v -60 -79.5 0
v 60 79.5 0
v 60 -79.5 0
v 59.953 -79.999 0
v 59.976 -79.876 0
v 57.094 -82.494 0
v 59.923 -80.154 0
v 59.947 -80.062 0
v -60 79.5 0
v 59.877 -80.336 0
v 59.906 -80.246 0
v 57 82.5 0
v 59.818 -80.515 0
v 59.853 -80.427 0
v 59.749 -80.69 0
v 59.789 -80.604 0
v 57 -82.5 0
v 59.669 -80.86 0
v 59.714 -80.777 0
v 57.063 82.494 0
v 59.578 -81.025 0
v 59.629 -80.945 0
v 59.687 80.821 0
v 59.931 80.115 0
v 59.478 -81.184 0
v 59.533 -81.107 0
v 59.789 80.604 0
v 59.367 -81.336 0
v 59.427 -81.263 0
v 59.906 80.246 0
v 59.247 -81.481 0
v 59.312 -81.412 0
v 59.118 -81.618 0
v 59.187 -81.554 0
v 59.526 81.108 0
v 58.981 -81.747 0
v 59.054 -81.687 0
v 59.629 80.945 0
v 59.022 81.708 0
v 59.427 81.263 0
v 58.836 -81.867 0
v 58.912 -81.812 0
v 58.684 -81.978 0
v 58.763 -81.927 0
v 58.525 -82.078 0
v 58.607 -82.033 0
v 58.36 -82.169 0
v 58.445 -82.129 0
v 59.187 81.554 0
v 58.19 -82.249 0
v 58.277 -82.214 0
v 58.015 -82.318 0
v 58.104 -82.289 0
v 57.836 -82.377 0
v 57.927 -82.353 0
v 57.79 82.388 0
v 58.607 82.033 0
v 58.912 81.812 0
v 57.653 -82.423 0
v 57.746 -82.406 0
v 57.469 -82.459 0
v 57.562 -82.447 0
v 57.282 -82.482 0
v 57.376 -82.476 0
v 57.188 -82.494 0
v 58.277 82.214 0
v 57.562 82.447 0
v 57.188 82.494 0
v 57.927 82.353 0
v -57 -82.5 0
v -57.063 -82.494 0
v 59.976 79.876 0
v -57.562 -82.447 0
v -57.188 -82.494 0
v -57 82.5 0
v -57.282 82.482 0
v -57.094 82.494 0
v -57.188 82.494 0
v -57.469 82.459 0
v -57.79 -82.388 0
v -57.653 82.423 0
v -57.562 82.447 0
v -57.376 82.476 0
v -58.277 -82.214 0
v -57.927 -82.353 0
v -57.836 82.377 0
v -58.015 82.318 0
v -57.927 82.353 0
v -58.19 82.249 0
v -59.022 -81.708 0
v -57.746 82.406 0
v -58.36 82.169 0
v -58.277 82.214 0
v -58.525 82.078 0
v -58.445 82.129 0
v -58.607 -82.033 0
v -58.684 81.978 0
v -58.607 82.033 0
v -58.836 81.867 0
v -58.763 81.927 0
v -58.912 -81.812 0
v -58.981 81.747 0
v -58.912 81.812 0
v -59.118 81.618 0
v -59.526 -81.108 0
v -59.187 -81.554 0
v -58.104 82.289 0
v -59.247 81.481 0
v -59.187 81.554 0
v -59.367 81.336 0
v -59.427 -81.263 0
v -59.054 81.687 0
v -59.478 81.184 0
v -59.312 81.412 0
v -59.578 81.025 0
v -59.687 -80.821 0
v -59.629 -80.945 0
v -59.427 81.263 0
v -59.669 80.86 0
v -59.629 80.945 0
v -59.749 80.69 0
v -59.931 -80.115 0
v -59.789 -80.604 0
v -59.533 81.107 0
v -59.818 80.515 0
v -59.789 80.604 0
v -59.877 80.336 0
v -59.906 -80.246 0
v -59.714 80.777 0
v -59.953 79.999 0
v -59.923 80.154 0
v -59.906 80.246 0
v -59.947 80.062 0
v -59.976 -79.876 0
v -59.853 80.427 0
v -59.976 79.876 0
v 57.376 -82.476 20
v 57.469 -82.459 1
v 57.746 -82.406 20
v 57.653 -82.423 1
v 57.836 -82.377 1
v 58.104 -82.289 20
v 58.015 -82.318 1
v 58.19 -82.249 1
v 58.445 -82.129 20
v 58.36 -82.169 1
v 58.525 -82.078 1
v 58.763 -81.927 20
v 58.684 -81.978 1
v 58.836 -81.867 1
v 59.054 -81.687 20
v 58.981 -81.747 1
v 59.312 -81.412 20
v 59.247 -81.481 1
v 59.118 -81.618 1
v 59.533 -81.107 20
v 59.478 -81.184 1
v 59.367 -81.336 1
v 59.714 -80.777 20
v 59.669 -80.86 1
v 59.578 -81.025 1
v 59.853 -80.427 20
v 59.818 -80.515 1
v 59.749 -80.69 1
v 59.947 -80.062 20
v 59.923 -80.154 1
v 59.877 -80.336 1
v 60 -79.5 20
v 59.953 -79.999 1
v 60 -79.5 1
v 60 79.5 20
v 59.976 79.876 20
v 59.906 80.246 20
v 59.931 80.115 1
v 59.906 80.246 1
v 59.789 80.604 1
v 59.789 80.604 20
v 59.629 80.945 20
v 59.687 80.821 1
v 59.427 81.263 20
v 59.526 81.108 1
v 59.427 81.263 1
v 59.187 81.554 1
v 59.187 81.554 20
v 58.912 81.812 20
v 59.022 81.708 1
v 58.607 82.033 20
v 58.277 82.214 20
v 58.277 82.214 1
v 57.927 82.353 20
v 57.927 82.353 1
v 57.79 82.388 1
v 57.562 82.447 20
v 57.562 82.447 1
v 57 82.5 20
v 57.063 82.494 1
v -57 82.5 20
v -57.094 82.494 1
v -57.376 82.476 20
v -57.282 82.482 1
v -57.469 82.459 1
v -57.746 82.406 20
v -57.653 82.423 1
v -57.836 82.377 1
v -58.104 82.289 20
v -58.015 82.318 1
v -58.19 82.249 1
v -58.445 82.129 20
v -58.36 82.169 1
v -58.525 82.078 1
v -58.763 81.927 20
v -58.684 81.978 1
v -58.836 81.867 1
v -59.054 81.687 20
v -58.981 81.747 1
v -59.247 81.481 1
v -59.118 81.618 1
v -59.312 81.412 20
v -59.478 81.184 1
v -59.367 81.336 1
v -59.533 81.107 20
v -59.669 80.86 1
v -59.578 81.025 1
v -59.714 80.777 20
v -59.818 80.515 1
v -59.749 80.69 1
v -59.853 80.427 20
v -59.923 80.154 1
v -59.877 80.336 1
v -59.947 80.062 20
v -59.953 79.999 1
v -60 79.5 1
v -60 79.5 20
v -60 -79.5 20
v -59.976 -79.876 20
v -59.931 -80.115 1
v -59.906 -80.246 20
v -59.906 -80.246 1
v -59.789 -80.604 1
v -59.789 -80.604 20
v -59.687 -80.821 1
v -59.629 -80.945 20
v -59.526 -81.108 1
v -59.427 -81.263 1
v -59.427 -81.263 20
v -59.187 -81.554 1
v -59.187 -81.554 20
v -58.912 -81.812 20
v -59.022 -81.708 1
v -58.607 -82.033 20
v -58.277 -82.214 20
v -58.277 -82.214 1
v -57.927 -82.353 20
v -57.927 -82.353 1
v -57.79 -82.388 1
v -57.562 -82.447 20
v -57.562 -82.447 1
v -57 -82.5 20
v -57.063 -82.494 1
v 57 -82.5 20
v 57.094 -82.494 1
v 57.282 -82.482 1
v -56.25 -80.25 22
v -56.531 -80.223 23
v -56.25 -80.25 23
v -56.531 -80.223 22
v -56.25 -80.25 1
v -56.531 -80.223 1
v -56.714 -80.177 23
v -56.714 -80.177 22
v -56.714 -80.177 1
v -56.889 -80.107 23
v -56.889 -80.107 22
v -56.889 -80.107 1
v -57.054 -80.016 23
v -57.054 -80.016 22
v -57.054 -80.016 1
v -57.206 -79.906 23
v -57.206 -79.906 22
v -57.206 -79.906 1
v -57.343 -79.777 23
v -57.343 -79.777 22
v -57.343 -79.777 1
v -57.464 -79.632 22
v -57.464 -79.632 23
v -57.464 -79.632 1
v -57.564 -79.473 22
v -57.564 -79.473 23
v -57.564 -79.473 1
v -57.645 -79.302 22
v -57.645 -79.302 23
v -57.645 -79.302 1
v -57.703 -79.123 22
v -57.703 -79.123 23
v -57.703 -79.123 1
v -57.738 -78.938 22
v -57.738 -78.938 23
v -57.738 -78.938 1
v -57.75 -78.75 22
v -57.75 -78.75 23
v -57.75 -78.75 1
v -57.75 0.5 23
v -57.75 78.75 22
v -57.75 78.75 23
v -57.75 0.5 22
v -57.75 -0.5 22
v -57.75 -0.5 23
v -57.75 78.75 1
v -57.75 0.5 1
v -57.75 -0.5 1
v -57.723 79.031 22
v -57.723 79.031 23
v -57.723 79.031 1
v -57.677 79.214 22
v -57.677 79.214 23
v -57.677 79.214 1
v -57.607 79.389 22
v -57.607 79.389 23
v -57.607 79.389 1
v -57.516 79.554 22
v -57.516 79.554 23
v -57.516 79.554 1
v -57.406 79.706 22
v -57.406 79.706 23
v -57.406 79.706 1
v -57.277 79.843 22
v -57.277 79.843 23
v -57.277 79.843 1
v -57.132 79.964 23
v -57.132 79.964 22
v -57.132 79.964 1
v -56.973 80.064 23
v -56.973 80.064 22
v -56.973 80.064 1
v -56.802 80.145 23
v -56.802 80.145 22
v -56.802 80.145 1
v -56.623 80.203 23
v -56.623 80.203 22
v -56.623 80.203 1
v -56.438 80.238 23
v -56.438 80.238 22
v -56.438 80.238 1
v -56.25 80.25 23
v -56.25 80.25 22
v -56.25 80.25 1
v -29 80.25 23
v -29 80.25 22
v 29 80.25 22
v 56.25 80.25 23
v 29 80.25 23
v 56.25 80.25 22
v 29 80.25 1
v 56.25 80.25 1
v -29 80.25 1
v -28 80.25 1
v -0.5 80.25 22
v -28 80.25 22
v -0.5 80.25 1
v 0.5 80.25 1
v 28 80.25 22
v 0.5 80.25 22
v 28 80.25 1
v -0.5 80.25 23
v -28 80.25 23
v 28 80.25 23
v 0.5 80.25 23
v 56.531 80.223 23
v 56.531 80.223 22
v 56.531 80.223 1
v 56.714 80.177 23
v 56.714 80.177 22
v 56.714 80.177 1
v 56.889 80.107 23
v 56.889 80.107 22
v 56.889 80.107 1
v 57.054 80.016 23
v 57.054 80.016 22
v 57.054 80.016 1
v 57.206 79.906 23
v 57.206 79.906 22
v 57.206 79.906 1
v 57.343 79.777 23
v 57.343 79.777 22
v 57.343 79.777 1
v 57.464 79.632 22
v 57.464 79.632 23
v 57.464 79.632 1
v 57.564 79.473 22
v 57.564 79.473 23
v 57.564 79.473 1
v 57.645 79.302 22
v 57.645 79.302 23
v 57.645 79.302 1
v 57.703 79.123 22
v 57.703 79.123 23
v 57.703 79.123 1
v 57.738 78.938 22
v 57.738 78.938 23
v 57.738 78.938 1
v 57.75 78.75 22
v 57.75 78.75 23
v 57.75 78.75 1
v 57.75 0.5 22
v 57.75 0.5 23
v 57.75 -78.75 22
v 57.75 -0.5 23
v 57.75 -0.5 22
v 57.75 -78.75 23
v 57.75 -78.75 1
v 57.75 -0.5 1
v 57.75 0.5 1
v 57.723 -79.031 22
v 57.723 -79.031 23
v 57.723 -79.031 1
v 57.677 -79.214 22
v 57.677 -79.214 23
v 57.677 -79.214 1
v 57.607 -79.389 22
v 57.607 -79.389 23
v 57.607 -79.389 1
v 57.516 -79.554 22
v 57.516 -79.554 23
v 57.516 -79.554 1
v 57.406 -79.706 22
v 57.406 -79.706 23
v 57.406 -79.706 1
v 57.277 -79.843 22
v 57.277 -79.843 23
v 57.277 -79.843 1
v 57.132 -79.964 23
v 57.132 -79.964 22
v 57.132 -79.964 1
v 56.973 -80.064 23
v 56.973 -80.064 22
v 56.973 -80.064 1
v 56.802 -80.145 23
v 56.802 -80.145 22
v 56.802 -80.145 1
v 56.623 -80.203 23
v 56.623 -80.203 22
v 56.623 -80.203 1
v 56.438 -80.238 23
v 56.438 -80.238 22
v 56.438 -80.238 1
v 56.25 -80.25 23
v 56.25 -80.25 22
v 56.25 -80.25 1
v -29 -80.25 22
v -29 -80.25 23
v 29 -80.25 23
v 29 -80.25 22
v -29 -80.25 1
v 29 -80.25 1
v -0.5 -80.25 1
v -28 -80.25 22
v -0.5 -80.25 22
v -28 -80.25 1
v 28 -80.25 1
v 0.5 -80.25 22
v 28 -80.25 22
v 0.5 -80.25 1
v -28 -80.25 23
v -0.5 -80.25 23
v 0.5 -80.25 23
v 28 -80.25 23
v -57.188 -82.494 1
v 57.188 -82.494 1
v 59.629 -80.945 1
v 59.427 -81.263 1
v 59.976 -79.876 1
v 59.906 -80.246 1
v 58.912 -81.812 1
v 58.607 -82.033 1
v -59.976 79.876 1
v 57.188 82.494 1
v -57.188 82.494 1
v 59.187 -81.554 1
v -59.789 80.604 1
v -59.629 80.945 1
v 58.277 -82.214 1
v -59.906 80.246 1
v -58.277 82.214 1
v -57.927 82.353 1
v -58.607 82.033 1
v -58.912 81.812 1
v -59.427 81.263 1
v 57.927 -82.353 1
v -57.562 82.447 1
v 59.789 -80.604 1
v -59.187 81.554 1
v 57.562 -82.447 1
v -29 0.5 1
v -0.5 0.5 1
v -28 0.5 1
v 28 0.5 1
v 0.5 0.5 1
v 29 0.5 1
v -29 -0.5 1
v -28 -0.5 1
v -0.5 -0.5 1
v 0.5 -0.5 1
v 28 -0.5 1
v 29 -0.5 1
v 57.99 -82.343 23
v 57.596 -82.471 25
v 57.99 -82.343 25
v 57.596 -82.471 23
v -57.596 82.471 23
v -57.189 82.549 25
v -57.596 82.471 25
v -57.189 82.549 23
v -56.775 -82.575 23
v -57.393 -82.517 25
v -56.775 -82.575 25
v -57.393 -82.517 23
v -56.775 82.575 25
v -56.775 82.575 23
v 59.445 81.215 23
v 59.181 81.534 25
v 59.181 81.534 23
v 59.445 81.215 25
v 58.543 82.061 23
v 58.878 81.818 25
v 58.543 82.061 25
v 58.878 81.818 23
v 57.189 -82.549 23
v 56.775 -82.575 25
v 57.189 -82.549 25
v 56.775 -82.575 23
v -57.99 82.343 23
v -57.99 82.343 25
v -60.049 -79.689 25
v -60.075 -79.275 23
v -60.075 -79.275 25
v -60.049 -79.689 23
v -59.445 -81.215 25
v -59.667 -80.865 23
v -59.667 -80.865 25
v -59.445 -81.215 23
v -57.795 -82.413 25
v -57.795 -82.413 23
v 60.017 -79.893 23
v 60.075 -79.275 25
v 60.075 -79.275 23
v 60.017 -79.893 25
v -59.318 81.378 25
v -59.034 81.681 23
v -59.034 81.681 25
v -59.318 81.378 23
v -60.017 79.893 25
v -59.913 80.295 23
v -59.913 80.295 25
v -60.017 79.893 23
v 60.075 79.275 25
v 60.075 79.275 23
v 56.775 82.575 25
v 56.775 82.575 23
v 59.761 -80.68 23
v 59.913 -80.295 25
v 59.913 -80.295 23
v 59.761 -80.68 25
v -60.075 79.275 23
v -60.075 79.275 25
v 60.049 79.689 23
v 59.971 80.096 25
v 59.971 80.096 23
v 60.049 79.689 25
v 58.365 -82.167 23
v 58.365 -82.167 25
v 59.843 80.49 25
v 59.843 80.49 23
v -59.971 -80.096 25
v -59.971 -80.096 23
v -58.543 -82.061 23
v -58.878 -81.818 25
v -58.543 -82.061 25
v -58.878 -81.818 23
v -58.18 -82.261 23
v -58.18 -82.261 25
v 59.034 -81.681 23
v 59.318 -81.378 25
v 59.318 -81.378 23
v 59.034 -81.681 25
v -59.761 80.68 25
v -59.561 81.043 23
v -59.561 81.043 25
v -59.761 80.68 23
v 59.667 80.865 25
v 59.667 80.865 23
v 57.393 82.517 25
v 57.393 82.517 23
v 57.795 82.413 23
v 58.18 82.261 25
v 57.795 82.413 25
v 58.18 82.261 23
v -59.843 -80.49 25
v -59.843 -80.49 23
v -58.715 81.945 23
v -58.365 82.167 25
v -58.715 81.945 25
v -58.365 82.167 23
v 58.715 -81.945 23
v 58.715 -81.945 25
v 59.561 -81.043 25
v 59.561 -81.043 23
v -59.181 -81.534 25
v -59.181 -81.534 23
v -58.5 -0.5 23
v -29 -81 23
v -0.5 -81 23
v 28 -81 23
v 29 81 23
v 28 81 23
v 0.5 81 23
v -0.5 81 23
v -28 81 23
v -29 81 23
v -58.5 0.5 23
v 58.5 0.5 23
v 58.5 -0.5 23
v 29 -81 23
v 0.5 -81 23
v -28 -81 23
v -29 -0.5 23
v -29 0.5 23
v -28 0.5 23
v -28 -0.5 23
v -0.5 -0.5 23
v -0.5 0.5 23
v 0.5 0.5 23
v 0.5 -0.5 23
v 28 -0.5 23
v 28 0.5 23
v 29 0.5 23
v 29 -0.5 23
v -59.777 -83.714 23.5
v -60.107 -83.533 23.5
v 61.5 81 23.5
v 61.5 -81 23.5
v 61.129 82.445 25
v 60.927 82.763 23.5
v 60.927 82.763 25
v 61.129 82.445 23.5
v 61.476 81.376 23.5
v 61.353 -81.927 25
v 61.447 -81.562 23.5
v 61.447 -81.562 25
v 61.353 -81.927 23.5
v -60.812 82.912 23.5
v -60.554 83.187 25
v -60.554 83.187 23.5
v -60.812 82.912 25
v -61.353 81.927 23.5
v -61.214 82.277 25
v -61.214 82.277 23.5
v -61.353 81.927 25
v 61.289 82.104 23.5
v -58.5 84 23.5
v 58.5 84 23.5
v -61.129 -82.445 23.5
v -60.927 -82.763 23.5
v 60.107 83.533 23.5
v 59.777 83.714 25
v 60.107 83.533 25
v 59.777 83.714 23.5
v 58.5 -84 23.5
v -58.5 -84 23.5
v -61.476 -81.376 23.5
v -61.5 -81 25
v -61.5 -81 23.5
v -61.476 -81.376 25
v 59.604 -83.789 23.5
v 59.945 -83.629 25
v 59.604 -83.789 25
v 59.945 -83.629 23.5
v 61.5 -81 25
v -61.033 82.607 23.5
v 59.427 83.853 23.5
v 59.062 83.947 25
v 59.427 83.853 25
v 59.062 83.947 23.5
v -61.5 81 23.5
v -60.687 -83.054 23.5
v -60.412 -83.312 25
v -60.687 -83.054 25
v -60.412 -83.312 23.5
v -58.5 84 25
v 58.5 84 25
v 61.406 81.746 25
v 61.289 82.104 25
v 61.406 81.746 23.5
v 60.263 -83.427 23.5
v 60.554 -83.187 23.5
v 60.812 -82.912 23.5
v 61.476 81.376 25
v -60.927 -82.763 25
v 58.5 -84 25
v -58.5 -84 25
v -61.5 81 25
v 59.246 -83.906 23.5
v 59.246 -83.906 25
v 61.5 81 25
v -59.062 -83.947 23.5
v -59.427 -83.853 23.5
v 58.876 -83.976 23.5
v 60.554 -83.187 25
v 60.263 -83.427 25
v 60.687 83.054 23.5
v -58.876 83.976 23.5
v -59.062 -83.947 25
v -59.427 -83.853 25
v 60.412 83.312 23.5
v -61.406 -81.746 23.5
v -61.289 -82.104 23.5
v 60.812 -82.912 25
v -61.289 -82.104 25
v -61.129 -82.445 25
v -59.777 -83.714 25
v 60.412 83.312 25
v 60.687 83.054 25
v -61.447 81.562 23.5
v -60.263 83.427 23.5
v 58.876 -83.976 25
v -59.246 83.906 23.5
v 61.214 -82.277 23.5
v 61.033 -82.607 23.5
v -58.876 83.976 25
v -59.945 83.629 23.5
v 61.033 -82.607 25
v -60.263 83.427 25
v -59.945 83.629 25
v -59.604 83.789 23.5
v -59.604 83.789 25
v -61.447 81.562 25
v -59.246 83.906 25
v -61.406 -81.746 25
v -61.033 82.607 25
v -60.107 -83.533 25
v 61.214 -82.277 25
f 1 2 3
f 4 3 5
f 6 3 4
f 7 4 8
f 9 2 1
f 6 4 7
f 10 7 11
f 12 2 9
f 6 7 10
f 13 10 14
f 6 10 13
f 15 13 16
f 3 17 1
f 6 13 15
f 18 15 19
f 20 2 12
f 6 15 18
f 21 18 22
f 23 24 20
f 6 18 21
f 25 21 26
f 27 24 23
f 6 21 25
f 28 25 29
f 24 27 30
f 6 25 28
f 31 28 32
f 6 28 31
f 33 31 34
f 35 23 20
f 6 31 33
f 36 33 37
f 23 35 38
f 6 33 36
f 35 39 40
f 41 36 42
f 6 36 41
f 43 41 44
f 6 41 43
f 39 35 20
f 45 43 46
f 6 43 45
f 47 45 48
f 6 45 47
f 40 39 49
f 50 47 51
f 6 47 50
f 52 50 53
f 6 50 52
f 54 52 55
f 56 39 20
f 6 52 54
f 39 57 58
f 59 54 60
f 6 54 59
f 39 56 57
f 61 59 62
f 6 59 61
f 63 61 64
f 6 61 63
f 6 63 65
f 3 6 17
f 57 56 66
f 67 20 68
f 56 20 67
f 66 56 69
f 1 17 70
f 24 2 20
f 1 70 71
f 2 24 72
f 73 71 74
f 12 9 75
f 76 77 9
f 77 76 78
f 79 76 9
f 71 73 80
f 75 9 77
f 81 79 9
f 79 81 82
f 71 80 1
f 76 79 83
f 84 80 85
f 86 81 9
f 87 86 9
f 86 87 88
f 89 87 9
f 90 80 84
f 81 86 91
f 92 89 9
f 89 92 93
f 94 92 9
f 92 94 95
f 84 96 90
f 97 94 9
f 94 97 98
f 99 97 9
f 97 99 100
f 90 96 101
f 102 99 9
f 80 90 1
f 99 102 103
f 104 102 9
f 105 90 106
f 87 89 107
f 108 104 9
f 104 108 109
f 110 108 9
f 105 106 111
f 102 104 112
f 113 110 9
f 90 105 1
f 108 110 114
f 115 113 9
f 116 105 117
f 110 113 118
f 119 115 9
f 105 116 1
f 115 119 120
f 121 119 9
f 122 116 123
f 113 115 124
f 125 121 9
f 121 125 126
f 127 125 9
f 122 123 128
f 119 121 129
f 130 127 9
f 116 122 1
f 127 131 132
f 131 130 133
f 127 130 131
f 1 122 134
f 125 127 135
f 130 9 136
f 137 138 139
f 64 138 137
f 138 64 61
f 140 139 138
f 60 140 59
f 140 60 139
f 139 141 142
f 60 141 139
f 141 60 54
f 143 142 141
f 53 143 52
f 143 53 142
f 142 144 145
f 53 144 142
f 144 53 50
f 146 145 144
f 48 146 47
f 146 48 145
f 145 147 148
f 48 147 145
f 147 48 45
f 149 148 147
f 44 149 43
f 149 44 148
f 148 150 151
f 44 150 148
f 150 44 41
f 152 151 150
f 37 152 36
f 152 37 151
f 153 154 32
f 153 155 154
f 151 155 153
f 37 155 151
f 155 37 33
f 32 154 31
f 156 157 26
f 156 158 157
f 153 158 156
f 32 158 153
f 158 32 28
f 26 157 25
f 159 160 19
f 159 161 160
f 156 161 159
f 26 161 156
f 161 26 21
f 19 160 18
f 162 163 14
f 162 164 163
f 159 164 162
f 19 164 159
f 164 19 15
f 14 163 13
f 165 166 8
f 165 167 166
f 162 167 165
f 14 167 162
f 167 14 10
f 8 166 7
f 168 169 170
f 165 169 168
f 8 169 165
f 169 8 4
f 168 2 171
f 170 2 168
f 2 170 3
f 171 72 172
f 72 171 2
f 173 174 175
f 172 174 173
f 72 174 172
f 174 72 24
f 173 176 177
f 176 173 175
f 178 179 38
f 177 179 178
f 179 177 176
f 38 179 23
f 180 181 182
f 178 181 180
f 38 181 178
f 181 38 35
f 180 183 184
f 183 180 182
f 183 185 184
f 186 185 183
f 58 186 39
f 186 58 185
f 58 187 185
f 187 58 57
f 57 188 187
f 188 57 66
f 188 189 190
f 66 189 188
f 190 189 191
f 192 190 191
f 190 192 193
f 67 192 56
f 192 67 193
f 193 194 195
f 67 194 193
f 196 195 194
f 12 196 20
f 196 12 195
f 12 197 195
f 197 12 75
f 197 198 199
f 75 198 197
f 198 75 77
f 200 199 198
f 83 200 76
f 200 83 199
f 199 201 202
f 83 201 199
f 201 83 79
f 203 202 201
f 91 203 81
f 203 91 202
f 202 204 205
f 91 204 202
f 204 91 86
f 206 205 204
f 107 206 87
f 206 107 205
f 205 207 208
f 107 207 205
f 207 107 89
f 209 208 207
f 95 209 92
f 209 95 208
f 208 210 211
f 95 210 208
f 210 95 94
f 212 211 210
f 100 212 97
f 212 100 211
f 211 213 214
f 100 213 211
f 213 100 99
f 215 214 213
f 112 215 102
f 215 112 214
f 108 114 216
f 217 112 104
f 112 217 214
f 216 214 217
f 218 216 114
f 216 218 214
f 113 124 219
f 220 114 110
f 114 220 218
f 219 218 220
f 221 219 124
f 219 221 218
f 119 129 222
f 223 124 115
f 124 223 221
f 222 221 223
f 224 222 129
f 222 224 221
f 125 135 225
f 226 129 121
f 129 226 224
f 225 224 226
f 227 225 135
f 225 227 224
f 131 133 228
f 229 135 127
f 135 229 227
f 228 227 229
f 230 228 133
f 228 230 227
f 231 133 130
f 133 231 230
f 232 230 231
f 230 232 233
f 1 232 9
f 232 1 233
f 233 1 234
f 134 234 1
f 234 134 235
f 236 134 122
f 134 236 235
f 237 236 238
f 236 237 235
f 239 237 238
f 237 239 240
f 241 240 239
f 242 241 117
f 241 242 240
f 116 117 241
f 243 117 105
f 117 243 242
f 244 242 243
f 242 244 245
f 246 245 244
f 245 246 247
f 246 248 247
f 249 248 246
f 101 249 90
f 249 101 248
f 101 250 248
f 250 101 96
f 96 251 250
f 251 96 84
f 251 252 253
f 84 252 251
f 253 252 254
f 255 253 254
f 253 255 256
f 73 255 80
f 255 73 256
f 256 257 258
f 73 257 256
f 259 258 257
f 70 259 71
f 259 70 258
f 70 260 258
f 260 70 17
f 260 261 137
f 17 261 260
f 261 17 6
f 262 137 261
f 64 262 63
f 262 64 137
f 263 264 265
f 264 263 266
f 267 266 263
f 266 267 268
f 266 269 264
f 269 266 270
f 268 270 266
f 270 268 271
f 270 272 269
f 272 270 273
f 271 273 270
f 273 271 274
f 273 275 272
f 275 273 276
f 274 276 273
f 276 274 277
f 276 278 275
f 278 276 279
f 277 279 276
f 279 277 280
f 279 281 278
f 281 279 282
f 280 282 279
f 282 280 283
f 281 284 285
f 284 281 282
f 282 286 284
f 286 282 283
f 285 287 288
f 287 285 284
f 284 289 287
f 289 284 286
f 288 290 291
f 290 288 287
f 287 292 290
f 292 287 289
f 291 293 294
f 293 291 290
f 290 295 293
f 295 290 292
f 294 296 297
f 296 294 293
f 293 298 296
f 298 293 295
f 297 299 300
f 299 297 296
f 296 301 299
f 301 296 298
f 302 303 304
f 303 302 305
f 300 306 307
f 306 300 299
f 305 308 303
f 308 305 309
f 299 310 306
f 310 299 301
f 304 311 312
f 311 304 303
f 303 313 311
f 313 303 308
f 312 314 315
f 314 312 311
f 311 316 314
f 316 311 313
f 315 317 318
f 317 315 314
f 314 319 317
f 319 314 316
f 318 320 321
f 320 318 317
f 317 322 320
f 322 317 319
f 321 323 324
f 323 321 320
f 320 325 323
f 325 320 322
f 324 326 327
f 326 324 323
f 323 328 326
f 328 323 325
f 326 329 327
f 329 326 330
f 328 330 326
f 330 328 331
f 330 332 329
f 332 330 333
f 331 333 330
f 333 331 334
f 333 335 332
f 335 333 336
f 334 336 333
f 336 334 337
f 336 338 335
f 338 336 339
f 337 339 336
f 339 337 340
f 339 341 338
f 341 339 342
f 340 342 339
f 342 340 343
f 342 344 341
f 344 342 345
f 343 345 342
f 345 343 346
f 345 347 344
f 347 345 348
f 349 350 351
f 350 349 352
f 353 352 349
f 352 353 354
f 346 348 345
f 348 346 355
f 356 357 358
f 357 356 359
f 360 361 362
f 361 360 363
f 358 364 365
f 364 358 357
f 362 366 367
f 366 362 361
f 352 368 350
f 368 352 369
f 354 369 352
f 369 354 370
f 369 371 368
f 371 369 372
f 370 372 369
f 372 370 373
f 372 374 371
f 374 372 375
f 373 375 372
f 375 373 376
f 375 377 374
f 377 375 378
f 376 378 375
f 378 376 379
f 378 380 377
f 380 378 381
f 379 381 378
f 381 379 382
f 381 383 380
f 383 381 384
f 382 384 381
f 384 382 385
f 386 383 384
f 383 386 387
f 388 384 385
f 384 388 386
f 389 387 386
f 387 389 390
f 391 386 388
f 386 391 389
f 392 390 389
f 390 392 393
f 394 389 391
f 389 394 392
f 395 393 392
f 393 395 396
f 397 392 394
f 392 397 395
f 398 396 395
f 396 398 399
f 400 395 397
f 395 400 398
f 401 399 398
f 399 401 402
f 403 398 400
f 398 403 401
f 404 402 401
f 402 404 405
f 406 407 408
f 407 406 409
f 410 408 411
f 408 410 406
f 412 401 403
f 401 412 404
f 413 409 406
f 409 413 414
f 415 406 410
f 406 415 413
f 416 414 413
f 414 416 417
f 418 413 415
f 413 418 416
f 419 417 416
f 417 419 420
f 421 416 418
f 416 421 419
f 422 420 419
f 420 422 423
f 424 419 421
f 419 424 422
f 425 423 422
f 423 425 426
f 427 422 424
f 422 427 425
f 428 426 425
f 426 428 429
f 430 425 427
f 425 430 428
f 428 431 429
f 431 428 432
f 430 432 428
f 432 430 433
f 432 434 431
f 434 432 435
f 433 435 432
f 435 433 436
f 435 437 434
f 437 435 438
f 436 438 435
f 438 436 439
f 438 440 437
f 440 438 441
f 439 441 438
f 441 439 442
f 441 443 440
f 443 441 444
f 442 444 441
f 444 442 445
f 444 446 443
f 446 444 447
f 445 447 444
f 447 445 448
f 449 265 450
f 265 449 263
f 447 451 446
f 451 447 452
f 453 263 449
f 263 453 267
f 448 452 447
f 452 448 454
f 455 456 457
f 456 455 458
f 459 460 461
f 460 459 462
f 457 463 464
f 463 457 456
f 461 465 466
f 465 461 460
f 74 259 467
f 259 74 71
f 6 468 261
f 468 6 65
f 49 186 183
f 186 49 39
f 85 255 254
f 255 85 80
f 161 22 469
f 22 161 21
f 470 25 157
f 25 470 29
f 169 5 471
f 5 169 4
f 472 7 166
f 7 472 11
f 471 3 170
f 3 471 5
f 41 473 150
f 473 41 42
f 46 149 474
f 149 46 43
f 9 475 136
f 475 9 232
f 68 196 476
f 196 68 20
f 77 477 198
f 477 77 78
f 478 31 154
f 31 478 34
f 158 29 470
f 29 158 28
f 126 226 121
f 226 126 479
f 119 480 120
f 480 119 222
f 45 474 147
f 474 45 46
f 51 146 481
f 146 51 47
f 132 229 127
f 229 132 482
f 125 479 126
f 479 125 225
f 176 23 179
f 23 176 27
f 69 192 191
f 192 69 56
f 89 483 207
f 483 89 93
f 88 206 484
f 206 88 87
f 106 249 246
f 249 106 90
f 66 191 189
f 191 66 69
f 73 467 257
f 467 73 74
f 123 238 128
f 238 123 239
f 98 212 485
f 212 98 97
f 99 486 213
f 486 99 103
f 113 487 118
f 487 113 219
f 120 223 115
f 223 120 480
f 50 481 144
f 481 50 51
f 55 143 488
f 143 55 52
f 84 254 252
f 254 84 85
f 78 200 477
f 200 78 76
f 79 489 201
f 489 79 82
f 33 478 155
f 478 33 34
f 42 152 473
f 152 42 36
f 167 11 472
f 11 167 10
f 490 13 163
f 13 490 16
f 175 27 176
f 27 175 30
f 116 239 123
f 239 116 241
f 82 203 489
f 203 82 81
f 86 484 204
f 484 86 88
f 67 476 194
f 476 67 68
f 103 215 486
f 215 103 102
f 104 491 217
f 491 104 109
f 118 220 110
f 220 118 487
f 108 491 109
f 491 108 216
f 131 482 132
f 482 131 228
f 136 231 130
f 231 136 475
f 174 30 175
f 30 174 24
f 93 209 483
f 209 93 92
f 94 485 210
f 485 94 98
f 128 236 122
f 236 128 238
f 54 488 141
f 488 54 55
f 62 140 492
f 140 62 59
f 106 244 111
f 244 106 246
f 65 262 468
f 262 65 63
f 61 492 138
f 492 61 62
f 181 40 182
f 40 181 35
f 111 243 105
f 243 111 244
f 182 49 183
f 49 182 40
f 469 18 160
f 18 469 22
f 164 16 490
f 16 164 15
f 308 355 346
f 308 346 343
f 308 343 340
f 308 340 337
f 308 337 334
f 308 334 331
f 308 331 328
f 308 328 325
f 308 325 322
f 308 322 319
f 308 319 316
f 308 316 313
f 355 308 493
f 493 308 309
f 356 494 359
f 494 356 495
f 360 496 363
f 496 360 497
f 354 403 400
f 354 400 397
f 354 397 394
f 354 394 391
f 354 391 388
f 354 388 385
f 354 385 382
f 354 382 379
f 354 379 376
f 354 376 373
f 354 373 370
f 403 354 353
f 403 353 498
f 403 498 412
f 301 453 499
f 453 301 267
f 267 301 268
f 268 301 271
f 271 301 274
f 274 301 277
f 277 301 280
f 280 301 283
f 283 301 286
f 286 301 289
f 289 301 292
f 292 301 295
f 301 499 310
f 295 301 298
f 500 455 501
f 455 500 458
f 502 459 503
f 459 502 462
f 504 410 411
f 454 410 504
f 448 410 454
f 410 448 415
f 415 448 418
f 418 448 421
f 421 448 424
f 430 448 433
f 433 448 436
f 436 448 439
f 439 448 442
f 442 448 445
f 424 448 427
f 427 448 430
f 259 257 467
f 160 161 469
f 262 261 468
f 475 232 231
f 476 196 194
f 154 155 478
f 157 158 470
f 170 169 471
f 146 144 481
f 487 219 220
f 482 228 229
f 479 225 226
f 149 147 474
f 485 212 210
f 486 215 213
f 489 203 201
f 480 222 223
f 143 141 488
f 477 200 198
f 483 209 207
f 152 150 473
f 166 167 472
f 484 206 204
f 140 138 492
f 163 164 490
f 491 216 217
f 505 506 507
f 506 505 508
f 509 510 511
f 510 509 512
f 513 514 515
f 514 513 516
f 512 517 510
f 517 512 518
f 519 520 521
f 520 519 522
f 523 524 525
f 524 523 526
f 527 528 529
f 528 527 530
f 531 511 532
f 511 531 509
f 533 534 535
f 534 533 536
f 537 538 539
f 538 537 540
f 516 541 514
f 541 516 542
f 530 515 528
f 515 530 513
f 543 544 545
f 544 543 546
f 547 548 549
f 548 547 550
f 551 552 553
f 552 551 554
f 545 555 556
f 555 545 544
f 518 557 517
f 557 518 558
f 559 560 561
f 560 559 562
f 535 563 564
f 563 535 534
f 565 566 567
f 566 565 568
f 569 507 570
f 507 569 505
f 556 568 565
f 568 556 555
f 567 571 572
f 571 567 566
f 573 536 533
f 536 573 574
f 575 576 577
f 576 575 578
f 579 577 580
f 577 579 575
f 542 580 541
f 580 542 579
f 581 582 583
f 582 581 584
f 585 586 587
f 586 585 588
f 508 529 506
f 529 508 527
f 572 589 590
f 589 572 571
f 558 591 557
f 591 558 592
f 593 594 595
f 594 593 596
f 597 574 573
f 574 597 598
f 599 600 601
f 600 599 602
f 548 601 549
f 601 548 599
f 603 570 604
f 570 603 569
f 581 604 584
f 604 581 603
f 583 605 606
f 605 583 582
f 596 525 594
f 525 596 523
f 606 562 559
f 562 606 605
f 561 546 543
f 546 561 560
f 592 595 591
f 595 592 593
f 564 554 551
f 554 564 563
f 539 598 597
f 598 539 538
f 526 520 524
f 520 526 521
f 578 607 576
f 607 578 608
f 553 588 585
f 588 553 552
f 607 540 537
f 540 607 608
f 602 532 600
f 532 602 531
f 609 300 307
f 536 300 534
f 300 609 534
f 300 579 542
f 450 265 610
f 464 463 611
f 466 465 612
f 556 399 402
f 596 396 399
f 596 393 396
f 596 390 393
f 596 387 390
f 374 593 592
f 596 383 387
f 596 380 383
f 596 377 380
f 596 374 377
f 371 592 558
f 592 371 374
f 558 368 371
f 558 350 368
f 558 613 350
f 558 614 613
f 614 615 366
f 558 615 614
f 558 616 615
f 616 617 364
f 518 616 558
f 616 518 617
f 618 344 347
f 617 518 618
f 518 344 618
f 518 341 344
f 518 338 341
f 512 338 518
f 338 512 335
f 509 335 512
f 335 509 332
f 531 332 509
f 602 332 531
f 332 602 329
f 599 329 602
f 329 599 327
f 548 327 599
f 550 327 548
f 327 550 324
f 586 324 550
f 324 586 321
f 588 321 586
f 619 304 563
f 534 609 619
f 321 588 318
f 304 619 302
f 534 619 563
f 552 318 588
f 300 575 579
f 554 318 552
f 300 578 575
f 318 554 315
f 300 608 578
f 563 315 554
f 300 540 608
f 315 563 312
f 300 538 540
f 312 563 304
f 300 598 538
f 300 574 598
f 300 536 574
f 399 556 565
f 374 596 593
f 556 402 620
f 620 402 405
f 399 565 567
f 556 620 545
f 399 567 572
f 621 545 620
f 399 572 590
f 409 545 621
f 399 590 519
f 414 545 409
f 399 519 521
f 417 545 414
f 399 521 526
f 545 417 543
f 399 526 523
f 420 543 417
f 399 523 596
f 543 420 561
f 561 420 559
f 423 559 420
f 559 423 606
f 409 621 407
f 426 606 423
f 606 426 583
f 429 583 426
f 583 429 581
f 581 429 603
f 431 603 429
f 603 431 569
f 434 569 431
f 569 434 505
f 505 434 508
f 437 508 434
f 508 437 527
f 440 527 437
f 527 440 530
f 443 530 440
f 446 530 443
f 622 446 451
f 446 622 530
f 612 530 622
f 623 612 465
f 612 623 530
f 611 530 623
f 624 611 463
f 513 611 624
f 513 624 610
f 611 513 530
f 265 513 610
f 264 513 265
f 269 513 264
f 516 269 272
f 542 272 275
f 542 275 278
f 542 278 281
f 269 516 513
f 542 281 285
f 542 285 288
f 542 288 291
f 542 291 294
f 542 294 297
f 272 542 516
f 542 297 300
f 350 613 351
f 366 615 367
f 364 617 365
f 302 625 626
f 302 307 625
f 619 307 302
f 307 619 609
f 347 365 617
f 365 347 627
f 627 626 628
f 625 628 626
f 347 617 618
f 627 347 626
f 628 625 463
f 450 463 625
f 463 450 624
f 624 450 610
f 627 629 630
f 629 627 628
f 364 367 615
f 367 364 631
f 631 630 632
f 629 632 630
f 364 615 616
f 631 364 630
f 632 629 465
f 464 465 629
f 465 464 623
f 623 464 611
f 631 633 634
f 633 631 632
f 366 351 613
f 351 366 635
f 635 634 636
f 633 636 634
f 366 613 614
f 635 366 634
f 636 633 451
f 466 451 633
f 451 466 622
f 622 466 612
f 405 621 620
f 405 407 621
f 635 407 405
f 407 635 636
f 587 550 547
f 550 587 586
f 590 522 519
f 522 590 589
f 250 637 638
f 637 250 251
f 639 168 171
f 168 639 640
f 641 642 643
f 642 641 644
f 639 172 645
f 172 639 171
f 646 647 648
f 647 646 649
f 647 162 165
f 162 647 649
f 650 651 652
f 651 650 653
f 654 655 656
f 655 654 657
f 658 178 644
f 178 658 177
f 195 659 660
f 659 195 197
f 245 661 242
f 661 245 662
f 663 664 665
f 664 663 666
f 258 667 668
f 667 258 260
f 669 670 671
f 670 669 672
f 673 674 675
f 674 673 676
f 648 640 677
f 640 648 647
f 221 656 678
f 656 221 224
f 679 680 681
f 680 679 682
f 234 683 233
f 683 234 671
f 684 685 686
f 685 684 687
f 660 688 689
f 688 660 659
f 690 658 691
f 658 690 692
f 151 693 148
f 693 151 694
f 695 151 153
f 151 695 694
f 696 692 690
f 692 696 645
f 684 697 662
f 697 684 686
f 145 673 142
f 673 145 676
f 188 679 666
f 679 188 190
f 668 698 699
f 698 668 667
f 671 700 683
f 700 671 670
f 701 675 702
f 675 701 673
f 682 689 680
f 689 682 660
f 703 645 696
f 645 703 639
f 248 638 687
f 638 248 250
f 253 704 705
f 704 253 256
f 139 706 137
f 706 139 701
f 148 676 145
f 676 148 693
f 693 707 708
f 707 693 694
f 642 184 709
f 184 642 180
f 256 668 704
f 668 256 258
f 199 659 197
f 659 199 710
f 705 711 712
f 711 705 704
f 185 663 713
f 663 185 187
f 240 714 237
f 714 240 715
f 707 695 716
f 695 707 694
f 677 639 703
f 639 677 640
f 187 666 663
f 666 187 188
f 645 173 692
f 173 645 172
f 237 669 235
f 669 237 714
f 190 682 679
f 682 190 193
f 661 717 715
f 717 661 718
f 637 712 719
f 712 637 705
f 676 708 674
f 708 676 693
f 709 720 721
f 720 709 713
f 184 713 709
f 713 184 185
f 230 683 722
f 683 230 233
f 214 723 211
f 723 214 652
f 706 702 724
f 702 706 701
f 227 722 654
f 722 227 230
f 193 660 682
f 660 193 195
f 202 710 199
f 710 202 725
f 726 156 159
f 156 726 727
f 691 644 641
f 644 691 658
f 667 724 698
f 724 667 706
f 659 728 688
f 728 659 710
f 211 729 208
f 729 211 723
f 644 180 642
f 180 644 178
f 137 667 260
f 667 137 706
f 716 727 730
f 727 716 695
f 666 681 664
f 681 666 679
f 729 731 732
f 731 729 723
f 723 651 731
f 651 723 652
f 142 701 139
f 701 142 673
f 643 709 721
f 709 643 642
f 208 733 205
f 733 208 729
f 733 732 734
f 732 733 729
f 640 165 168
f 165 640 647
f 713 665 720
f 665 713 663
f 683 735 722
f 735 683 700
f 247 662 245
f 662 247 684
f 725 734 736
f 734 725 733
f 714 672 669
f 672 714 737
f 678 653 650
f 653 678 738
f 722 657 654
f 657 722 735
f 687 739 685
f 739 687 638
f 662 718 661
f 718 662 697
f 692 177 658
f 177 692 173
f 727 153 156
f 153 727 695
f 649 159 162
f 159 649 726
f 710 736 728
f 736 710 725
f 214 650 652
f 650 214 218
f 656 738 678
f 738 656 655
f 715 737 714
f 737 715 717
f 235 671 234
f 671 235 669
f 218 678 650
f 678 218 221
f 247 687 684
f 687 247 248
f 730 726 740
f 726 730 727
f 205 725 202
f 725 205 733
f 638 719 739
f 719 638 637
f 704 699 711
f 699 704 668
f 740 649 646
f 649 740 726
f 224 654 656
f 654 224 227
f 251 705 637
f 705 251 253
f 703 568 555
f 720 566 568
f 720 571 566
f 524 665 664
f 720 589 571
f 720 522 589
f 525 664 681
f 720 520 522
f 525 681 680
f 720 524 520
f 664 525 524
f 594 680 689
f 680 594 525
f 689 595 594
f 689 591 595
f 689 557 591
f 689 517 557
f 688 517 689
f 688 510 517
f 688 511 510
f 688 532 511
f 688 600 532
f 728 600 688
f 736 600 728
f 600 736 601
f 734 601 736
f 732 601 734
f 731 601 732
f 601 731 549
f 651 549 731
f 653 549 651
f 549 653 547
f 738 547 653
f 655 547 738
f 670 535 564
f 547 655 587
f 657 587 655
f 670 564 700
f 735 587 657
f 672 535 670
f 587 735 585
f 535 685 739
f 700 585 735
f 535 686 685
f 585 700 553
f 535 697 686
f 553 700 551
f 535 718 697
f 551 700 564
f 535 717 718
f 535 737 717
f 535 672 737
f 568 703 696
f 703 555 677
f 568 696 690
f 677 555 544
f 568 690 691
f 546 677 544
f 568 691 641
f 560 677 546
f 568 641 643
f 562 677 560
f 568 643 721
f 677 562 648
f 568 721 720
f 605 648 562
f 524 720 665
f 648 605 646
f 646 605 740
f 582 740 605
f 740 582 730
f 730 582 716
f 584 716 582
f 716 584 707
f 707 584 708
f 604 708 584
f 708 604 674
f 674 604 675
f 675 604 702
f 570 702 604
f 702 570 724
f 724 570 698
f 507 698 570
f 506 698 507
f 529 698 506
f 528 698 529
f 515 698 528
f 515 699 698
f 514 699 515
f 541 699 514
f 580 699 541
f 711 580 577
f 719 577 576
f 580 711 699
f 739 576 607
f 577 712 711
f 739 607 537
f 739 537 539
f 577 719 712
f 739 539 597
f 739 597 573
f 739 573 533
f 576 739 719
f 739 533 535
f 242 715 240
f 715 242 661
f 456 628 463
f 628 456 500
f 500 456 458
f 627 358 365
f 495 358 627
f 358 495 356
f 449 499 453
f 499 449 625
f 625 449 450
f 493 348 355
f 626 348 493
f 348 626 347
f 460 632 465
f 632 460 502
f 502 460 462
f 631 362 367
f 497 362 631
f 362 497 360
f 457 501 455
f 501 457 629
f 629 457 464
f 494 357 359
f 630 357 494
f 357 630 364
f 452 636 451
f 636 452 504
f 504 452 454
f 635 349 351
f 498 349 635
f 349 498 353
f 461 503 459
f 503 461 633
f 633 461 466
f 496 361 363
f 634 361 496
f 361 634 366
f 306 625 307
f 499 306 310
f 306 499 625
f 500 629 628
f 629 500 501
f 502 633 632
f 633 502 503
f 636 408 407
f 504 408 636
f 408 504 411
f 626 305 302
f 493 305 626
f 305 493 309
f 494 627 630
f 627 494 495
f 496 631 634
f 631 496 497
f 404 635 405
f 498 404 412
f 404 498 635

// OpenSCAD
$fn = $preview ? 50 : 50;

/*[Part]*/
// Select part to render
PART = "container"; //[container, lid, modules]

// Select module to render. Only applies if model is selected above
MODULE = "module_snap"; //[module_snap, module_hinge_knuckle, module_hinge_leaf]

// Generate Snap module for lid. If false snap module will interconnect boxes
SNAP_MODULE_LID = true;

/*[Dimensions]*/
// Add a top rim
RIM = true;

// Add Module Bay
MODULE_BAY = false;

// Number of MODBAY Screws
MOD_SCREWS = "4"; //[2vertical, 2horizontal, 4]

// Container Length in mm
BOX_L_OUTER = 165; //[50:5:300]

// Container Width in mm
BOX_W_OUTER = 120; //[50:5:300]

// Container Height in mm
BOX_H_OUTER = 25; //[25:5:300]

// Lid Thickness in mm
LID_H = 3; //[3:1:10]

// Corner Radius in mm
CORNER_RADIUS = 3; //[1:1:10]

// Top Rim in mm. Rim height is derived from this. This might interfere with module bay on low height containers
RIM_W = 3; //[3:1:10]

// Outer Wall Thickness
WALL_THICKNESS = 1.5; //[1:0.5:10]

// Inner Wall Thickness
DIVIDER_THICKNESS = 1; //[1:1:10]

// Floor Thickness
FLOOR_THICKNESS = 1; //[1:1:10]

// Number of Divisions on the Long Edge
DIVISIONS_L = 1; //[0:1:20]

// Number of Divisions on the Short Edge
DIVISIONS_W = 3; //[0:1:20]

// Width of Lock Fixtures
FIXTURE_W = 5; //[3:1:10]

// Thickness of Lock Fixtures
FIXTURE_THICKNESS = 4; //[3:1:10]

// Diamenter of Lock Bolts
HINGE_BOLT_D = 1.1; //[1:0.1:4]

// Screw insert Diameter
INSERT_D = 4; //[3:0.5:8]

// Add Module bottom snap socket
SNAP_SOCKET = true;

/*[Hidden]*/
module __customizer_limit__() {};
// above 2 lines make sure customizer does not show parameters below

// Width of Interlocking Mechanism
MODBAY_W = 30; //[20:2.5:50]

// Depth of Modbay
MODBAY_DEPTH = 12; //[10:1:20]

// Modbay Screw Coordinates
MBCs = [
    [ [ 0, 3, 5 ], [ 0, 3, 15 ] ],                             // 2vertical
    [ [ 9, 3, 13 ], [ -9, 3, 13 ] ],                           // 2horzontal
    [ [ 0, 3, 5 ], [ 0, 3, 15 ], [ 9, 3, 13 ], [ -9, 3, 13 ] ] // 4
];

MODBAY_SCREW_COORDINATES = MOD_SCREWS == "2vertical" ? MBCs[0] : MOD_SCREWS == "2horizontal" ? MBCs[1] : MBCs[2];

BOX_L = BOX_L_OUTER - 2 * CORNER_RADIUS; // Box Width
BOX_W = BOX_W_OUTER - 2 * CORNER_RADIUS; // Box Length
BOX_H = BOX_H_OUTER;                     // Box Height

// width module center
MOD_W = 15;

// module bay gap
MODBAY_GAP = 0.1;

POST_OFFSET = 10;

// Offset between snapping parts
PART_OFFSET = 0.3;

///////////////////////////////////////////////////////////////////////////////
// Derived Variables
///////////////////////////////////////////////////////////////////////////////

module_bay_offset = BOX_L / 2 + CORNER_RADIUS;

hinge_offset = BOX_L / 2 + CORNER_RADIUS;
hinge_coordinates = [[MODBAY_W / 2 - FIXTURE_W, hinge_offset, 0], [-MODBAY_W / 2, hinge_offset, 0]];

mod_template_height = BOX_H - RIM_W;

///////////////////////////////////////////////////////////////////////////////
// Modules
///////////////////////////////////////////////////////////////////////////////

// Container modules
////////////////////

module base_plate(length, width, thickness)
{
    corner_coordinates = [ [ 0, 0 ], [ 0, length ], [ width, length ], [ width, 0 ] ];

    translate([ -width / 2, -length / 2 ])
    {
        hull()
        {
            for (i = corner_coordinates)
            {
                translate(i) cylinder(r = CORNER_RADIUS, h = thickness);
            };
        };
    };
};

module container_hull()
{
    ext_h = RIM ? BOX_H - RIM_W : BOX_H;
    linear_extrude(ext_h) difference()
    {
        offset(r = CORNER_RADIUS) square([ BOX_W, BOX_L ], center = true);

        offset(r = CORNER_RADIUS - WALL_THICKNESS)
            square([ BOX_W - WALL_THICKNESS, BOX_L - WALL_THICKNESS ], center = true);
    }
    base_plate(BOX_L, BOX_W, FLOOR_THICKNESS);
};

module box_rim()
{
    difference()
    {
        hull()
        {
            // upper face
            translate([ 0, 0, -RIM_W / 2 ])
            {
                linear_extrude(RIM_W / 2)
                {
                    offset(r = CORNER_RADIUS) square([ BOX_W + RIM_W, BOX_L + RIM_W ], center = true);
                };
            };
            // lower face
            translate([ 0, 0, -2 * RIM_W + 1 ])
            {
                linear_extrude(RIM_W / 2)
                {
                    offset(r = CORNER_RADIUS) square([ BOX_W, BOX_L ], center = true);
                };
            };
        };
        // cutout
        union()
        {
            // upper
            translate([ 0, 0, -2 ])
            {
                linear_extrude(5)
                {
                    offset(r = CORNER_RADIUS + .3)
                        square([ BOX_W - RIM_W / 4 + PART_OFFSET, BOX_L - RIM_W / 4 + PART_OFFSET ], center = true);
                };
            };
            // lower
            translate([ 0, 0, -BOX_H / 2 ]) linear_extrude(BOX_H)
            {
                offset(r = CORNER_RADIUS - WALL_THICKNESS)
                    square([ BOX_W - WALL_THICKNESS, BOX_L - WALL_THICKNESS ], center = true);
            };
        };
    };
};

module module_bay_cutout(offset)
{
    cut_depth = MODBAY_DEPTH;
    cut_position_y = offset - cut_depth / 2;
    width = MOD_W + MODBAY_GAP;

    translate([ -width / 2, cut_position_y, 0 ])
    {
        cube([ width, cut_depth, BOX_H * 2 ]);
    };

    translate([ 0, module_bay_offset - 4, 0 ]) minkowski()
    {
        mod_template();
        translate([ 0, 0, 0 ]) cube([ MODBAY_GAP, 4, 2 ], center = true);
    };
};

module add_corner_concave(radius, thickness)
{
    rotate(90, [ 0, 1, 0 ]) difference()
    {
        cube([ radius, radius, thickness ]);
        cylinder(r = radius, h = thickness);
    };
};

module cut_corner_convex(radius, rotation, position, thickness)
{
    translate(position)
    {
        rotate(rotation, [ 1, 0, 0 ])
        {
            add_corner_concave(radius, thickness);
        };
    };
};

module module_bay()
{
    module insert_hole(coordinate)
    {
        // cut hole for screw insert
        y = coordinate[0];
        x = coordinate[1];
        z = coordinate[2];
        translate([ 4.5, y, z ])
        {
            rotate(90, [ 0, 1, 0 ])
            {
                cylinder(d = INSERT_D, h = 3, center = true);
            };
        };
    };

    translate([ 0, BOX_L_OUTER / 2, 0 ]) rotate(-90, [ 0, 0, 1 ]) render()
    {
        union()
        {
            difference()
            {
                // shell
                translate([ 1, 0, 0 ]) rotate(-90, [ 0, 0, 1 ]) difference()
                {
                    minkowski()
                    {
                        mod_template();
                        translate([ 0, 1, -1 ]) cube([ 3, 4, 4 ], center = true);
                    };
                    translate([ -25, -1, BOX_H - 2 ]) cube(50);
                    translate([ -25, -1, -50 ]) cube(50);
                };
                //  cutout
                rotate(-90, [ 0, 0, 1 ]) minkowski()
                {
                    mod_template();
                    translate([ 0, -1.5, 0 ]) cube([ 0.1, 3, 0.2 ], center = true);
                };
                for (i = MODBAY_SCREW_COORDINATES)
                {
                    insert_hole(i);
                };
            };
            translate([ 1.5, 0, 1.5 ]) cube([ 3, 7.5, 3 ], center = true);
        };
    };
};

module division(count, length, width)
{
    step_x = width / (count + 1);
    for (i = [1:count])
    {
        translate([ -width / 2 + i * step_x, 0, BOX_H / 2 - 0.5 ])
        {
            cube([ DIVIDER_THICKNESS, length + RIM_W, BOX_H - RIM_W ], center = true);
        };
    };
};

// Lid modules
//////////////

module hinge_knuckle()
{
    rotate(90, [ 0, 1, 0 ]) difference()
    {
        union()
        {
            cylinder(h = MOD_W, d = 3.5, center = true);
            hull()
            {
                translate([ 1.0, 0, 0 ]) cube(size = [ 3, 3, MOD_W ], center = true);
                translate([ 3.5, 3, 0 ]) cube(size = [ 1, 3, MOD_W ], center = true);
            };
        };
        cylinder(h = MOD_W, d = HINGE_BOLT_D, center = true);
        translate([ -2.25, 0, 0 ]) cube(MOD_W / 2, center = true);
    };
};

module lid_phase()
{
    translate([ BOX_L / 2 - FIXTURE_W, BOX_W / 2 + 0.5, LID_H - 2 ])
    {
        rotate(45, [ 1, 0, 0 ])
        {
            cube([ BOX_L, LID_H, LID_H ]);
        };
    };
};

module lid_snap_lock()
{
    union()
    {
        translate([ 0, 5.5, 0 ]) cube([ 15 + 2 * MODBAY_GAP, 5, 2.1 ], center = true);
        translate([ 7.5 + MODBAY_GAP, 0, 3 ]) rotate(180, [ 0, 1, 0 ]) cube([ 4 + 2 * MODBAY_GAP, 5, LID_H ]);
        translate([ -3.5 + MODBAY_GAP, 0, 3 ]) rotate(180, [ 0, 1, 0 ]) cube([ 4 + 2 * MODBAY_GAP, 5, LID_H ]);
    };
};

//  Module bay modules
//////////////////////

module mod_clip_tip_half(positive = true)
{
    // dimensions
    lock_w = 15;
    corner_r = 3;
    thickness = 3;
    lock_offset = 0.2;
    lock_height = 10;

    module shape()
    {
        hull()
        {
            cube([ MOD_W / 2, thickness, 1 ]);

            translate([ 0, 0, lock_height ]) cube([ 1, thickness, 1 ]);
            translate([ lock_w / 2 - corner_r, corner_r, 8 ]) rotate(90, [ 1, 0, 0 ])
                cylinder(r = corner_r, h = thickness);
        };
    };

    if (positive)
    {
        shape();
    }
    else
    {
        minkowski()
        {
            shape();
            cube(size = lock_offset, center = true);
        };
    }
};

module mod_template_low()
{
    module mod_center()
    {
        translate([ 0, 0, 8 ])
        {
            cube([ MOD_W / 2, 3, BOX_H - 10 ]);
        };
    };

    module mod_side()
    {
        translate([ 0, 0, 3 ])
        {
            hull()
            {
                translate([ 9.5, 3, 11.7 ]) rotate(90, [ 1, 0, 0 ]) cylinder(d = 6, h = 3);
                translate([ 11.5, 3, 6 ]) rotate(90, [ 1, 0, 0 ]) cylinder(d = 2, h = 3);
                translate([ 0, 0, 5 ]) cube([ MOD_W / 2, 3, 9.7 ]);
            };
        };
    };

    module half_module()
    {
        mod_center();
        mod_side();
        translate([ 8.4, 0, 18.7 ]) rotate(90, [ 0, 0, 1 ]) add_corner_concave(1, 3);
    };

    union()
    {
        half_module();
        mirror([ 1, 0, 0 ]) half_module();
    };
};

module mod_template()
{
    module mod_center()
    {
        translate([ 0, 0, 0 ])
        {
            cube([ MOD_W / 2, 3, BOX_H - 2 ]);
        };
    };

    module mod_side()
    {
        translate([ 0, 0, 3 ])
        {
            hull()
            {
                translate([ 9.5, 3, 11.7 ]) rotate(90, [ 1, 0, 0 ]) cylinder(d = 6, h = 3);
                translate([ 11.5, 3, 1.1 ]) rotate(90, [ 1, 0, 0 ]) cylinder(d = 2, h = 3);
                cube([ 1, 3, 15 ]);
            };
        };
    };

    module half_module()
    {
        mod_center();
        mod_side();
        translate([ 8.4, 0, 18.7 ]) rotate(90, [ 0, 0, 1 ]) add_corner_concave(1, 3);
    };

    union()
    {
        half_module();
        mirror([ 1, 0, 0 ]) half_module();
    };
};

module mod_template_w_screwholes(screw_coordinates, low = true)
{
    difference()
    {
        if (low)
        {
            mod_template_low();
        }
        else
        {
            mod_template();
        };
        for (i = screw_coordinates)
        {
            translate(i) rotate(90, [ 1, 0, 0 ]) screw_hole();
        };
    };
};

module screw_hole()
{
    hull()
    {
        cylinder(d = 6.2, h = 0.25);
        translate([ 0, 0, 2 ]) cylinder(d = 3.2, h = 0.1);
    };
    cylinder(d = 3.2, h = 10);
};

module clip_nub()
{
    translate([ 0, 1.5, 1.5 ]) rotate(90, [ 1, 0, 0 ]) hull()
    {
        cube([ 7, 3, 3 ], center = true);
        translate([ 0, 3.5, -1.5 ]) cylinder(d = 7, h = 3);
    };
};

module clip_tip(positive)
{
    difference()
    {
        union()
        {
            mod_clip_tip_half(positive);
            mirror([ 1, 0, 0 ])
            {
                mod_clip_tip_half(positive);
            };
        };
        clip_nub();
    };
};

module clip_tip_lid()
{
    thickness = 3;
    difference()
    {
        hull()
        {
            translate([ 0, thickness / 2, 1 ]) cube([ 15, thickness, 2 ], center = true);
            translate([ 6.5, thickness / 2, 3.5 ]) rotate(90, [ 1, 0, 0 ])
                cylinder(d = 2, h = thickness, center = true);
            translate([ -6.5, thickness / 2, 3.5 ]) rotate(90, [ 1, 0, 0 ])
                cylinder(d = 2, h = thickness, center = true);
        };
        translate([ 0, 2.5, 1.5 ]) cube([ 7, 5, 3 ], center = true);
    };
};

module phase_edge(offset, w, a = 45)
{
    translate([ 0, 0, offset ]) //
    {
        rotate(a, [ 1, 0, 0 ])
        {
            cube([ w, 12, 2 ], center = true);
        };
    };
};

module flex_joint()
{
    minkowski()
    {
        cube([ 25, 3.8, 2 ], center = true);
        sphere(d = 1);
    };
};

module mod_snap_bottom_chamfer()
{
    hull()
    {
        translate([ 3.5, 0, -3 ]) cube(3);
        translate([ 7.6, 0, 0 ]) cube(3);
    };
};

///////////////////////////////////////////////////////////////////////////////
// Parts
///////////////////////////////////////////////////////////////////////////////

// Container
////////////

if (PART == "container")
{
    render()
    {
        union()
        {
            difference()
            {
                union()
                {
                    // create base shape
                    container_hull();

                    // add top rim
                    if (RIM)
                    {
                        translate([ 0, 0, BOX_H ])
                        {
                            box_rim();
                        };
                    };

                    // add division
                    if (DIVISIONS_W > 0)
                    {
                        division(DIVISIONS_W, BOX_L, BOX_W);
                    };
                    if (DIVISIONS_L > 0)
                    {
                        rotate(90, [ 0, 0, 1 ]) division(DIVISIONS_L, BOX_W, BOX_L);
                    };
                };
                if (MODULE_BAY)
                {
                    // make space for module bay
                    module_bay_cutout(module_bay_offset);
                    mirror([ 0, 1, 0 ])
                    {
                        module_bay_cutout(module_bay_offset);
                    };
                }
            };

            // add module_bay
            if (MODULE_BAY)
            {
                module_bay();
                mirror([ 0, 1, 0 ])
                {
                    module_bay();
                };
            }
        };
    };
};

// Lid
//////

if (PART == "lid")
{
    union()
    {
        difference()
        {
            // lid with interlocking ledge
            union()
            {
                if (RIM)
                {
                    base_plate(BOX_L, BOX_W, 3);
                    translate([ 0, 0, 3 - LID_H ]) base_plate(BOX_L + RIM_W, BOX_W + RIM_W, LID_H - 2);
                }
                else
                {
                    translate([ 0, 0, 3 - LID_H ]) base_plate(BOX_L, BOX_W, LID_H);
                };
            };
            translate([ 0, module_bay_offset - 3, 0 ]) lid_snap_lock();
            mirror([ 0, 1, 0 ]) translate([ 0, module_bay_offset - 3, 0 ]) lid_snap_lock();
        };
    };
};

if (PART == "modules")
{
    // Modbay module clip
    /////////////////////
    if (MODULE == "module_snap")
    {
        render()
        {
            difference()
            {
                union()
                {
                    // screw positions are overridden.
                    mod_template_w_screwholes(MBCs[1]);

                    if (SNAP_MODULE_LID)
                    {
                        translate([ 0, 0, mod_template_height + 1 ]) clip_tip_lid();
                    }
                    else
                    {
                        translate([ 0, 0, mod_template_height + 1 ]) clip_tip(true);
                    };
                };

                // add extra screw hole on high modules
                if (BOX_H >= 40)
                {
                    translate([ 0, 3, BOX_H - 10 ]) rotate(90, [ 1, 0, 0 ]) screw_hole();
                };

                // flex-joint:
                translate([ 0, 0, BOX_H - 5.2 ]) flex_joint();
                // phased edges:
                phase_edge(BOX_H + 2.5, 15); // clip tip
            };
        };
    }

    else if (MODULE == "module_hinge_knuckle")
    {
        render()
        {
            difference()
            {
                union()
                {
                    mod_template_w_screwholes(MBCs[0]);
                    translate([ 0, -1.5, BOX_H - .5 ]) hinge_knuckle();
                };

                if (SNAP_SOCKET)
                {
                    // bottom snap slot
                    translate([ 0, 1, 0 ]) clip_tip(false);
                    mod_snap_bottom_chamfer();
                    mirror([ 1, 0, 0 ]) mod_snap_bottom_chamfer();
                }
                translate([ 0, -1.5, BOX_H - .5 ]) rotate(90, [ 0, 1, 0 ])
                    cylinder(h = MOD_W / 2, d = 4.5, center = true);
            };
        };
    }

    else if (MODULE == "module_hinge_leaf")
    {
    }
}

//		cylinder(r=100,h=1);
//		linear_extrude (3)
//			text("Sry, not designed yet. :(",halign="center",valign="center");
